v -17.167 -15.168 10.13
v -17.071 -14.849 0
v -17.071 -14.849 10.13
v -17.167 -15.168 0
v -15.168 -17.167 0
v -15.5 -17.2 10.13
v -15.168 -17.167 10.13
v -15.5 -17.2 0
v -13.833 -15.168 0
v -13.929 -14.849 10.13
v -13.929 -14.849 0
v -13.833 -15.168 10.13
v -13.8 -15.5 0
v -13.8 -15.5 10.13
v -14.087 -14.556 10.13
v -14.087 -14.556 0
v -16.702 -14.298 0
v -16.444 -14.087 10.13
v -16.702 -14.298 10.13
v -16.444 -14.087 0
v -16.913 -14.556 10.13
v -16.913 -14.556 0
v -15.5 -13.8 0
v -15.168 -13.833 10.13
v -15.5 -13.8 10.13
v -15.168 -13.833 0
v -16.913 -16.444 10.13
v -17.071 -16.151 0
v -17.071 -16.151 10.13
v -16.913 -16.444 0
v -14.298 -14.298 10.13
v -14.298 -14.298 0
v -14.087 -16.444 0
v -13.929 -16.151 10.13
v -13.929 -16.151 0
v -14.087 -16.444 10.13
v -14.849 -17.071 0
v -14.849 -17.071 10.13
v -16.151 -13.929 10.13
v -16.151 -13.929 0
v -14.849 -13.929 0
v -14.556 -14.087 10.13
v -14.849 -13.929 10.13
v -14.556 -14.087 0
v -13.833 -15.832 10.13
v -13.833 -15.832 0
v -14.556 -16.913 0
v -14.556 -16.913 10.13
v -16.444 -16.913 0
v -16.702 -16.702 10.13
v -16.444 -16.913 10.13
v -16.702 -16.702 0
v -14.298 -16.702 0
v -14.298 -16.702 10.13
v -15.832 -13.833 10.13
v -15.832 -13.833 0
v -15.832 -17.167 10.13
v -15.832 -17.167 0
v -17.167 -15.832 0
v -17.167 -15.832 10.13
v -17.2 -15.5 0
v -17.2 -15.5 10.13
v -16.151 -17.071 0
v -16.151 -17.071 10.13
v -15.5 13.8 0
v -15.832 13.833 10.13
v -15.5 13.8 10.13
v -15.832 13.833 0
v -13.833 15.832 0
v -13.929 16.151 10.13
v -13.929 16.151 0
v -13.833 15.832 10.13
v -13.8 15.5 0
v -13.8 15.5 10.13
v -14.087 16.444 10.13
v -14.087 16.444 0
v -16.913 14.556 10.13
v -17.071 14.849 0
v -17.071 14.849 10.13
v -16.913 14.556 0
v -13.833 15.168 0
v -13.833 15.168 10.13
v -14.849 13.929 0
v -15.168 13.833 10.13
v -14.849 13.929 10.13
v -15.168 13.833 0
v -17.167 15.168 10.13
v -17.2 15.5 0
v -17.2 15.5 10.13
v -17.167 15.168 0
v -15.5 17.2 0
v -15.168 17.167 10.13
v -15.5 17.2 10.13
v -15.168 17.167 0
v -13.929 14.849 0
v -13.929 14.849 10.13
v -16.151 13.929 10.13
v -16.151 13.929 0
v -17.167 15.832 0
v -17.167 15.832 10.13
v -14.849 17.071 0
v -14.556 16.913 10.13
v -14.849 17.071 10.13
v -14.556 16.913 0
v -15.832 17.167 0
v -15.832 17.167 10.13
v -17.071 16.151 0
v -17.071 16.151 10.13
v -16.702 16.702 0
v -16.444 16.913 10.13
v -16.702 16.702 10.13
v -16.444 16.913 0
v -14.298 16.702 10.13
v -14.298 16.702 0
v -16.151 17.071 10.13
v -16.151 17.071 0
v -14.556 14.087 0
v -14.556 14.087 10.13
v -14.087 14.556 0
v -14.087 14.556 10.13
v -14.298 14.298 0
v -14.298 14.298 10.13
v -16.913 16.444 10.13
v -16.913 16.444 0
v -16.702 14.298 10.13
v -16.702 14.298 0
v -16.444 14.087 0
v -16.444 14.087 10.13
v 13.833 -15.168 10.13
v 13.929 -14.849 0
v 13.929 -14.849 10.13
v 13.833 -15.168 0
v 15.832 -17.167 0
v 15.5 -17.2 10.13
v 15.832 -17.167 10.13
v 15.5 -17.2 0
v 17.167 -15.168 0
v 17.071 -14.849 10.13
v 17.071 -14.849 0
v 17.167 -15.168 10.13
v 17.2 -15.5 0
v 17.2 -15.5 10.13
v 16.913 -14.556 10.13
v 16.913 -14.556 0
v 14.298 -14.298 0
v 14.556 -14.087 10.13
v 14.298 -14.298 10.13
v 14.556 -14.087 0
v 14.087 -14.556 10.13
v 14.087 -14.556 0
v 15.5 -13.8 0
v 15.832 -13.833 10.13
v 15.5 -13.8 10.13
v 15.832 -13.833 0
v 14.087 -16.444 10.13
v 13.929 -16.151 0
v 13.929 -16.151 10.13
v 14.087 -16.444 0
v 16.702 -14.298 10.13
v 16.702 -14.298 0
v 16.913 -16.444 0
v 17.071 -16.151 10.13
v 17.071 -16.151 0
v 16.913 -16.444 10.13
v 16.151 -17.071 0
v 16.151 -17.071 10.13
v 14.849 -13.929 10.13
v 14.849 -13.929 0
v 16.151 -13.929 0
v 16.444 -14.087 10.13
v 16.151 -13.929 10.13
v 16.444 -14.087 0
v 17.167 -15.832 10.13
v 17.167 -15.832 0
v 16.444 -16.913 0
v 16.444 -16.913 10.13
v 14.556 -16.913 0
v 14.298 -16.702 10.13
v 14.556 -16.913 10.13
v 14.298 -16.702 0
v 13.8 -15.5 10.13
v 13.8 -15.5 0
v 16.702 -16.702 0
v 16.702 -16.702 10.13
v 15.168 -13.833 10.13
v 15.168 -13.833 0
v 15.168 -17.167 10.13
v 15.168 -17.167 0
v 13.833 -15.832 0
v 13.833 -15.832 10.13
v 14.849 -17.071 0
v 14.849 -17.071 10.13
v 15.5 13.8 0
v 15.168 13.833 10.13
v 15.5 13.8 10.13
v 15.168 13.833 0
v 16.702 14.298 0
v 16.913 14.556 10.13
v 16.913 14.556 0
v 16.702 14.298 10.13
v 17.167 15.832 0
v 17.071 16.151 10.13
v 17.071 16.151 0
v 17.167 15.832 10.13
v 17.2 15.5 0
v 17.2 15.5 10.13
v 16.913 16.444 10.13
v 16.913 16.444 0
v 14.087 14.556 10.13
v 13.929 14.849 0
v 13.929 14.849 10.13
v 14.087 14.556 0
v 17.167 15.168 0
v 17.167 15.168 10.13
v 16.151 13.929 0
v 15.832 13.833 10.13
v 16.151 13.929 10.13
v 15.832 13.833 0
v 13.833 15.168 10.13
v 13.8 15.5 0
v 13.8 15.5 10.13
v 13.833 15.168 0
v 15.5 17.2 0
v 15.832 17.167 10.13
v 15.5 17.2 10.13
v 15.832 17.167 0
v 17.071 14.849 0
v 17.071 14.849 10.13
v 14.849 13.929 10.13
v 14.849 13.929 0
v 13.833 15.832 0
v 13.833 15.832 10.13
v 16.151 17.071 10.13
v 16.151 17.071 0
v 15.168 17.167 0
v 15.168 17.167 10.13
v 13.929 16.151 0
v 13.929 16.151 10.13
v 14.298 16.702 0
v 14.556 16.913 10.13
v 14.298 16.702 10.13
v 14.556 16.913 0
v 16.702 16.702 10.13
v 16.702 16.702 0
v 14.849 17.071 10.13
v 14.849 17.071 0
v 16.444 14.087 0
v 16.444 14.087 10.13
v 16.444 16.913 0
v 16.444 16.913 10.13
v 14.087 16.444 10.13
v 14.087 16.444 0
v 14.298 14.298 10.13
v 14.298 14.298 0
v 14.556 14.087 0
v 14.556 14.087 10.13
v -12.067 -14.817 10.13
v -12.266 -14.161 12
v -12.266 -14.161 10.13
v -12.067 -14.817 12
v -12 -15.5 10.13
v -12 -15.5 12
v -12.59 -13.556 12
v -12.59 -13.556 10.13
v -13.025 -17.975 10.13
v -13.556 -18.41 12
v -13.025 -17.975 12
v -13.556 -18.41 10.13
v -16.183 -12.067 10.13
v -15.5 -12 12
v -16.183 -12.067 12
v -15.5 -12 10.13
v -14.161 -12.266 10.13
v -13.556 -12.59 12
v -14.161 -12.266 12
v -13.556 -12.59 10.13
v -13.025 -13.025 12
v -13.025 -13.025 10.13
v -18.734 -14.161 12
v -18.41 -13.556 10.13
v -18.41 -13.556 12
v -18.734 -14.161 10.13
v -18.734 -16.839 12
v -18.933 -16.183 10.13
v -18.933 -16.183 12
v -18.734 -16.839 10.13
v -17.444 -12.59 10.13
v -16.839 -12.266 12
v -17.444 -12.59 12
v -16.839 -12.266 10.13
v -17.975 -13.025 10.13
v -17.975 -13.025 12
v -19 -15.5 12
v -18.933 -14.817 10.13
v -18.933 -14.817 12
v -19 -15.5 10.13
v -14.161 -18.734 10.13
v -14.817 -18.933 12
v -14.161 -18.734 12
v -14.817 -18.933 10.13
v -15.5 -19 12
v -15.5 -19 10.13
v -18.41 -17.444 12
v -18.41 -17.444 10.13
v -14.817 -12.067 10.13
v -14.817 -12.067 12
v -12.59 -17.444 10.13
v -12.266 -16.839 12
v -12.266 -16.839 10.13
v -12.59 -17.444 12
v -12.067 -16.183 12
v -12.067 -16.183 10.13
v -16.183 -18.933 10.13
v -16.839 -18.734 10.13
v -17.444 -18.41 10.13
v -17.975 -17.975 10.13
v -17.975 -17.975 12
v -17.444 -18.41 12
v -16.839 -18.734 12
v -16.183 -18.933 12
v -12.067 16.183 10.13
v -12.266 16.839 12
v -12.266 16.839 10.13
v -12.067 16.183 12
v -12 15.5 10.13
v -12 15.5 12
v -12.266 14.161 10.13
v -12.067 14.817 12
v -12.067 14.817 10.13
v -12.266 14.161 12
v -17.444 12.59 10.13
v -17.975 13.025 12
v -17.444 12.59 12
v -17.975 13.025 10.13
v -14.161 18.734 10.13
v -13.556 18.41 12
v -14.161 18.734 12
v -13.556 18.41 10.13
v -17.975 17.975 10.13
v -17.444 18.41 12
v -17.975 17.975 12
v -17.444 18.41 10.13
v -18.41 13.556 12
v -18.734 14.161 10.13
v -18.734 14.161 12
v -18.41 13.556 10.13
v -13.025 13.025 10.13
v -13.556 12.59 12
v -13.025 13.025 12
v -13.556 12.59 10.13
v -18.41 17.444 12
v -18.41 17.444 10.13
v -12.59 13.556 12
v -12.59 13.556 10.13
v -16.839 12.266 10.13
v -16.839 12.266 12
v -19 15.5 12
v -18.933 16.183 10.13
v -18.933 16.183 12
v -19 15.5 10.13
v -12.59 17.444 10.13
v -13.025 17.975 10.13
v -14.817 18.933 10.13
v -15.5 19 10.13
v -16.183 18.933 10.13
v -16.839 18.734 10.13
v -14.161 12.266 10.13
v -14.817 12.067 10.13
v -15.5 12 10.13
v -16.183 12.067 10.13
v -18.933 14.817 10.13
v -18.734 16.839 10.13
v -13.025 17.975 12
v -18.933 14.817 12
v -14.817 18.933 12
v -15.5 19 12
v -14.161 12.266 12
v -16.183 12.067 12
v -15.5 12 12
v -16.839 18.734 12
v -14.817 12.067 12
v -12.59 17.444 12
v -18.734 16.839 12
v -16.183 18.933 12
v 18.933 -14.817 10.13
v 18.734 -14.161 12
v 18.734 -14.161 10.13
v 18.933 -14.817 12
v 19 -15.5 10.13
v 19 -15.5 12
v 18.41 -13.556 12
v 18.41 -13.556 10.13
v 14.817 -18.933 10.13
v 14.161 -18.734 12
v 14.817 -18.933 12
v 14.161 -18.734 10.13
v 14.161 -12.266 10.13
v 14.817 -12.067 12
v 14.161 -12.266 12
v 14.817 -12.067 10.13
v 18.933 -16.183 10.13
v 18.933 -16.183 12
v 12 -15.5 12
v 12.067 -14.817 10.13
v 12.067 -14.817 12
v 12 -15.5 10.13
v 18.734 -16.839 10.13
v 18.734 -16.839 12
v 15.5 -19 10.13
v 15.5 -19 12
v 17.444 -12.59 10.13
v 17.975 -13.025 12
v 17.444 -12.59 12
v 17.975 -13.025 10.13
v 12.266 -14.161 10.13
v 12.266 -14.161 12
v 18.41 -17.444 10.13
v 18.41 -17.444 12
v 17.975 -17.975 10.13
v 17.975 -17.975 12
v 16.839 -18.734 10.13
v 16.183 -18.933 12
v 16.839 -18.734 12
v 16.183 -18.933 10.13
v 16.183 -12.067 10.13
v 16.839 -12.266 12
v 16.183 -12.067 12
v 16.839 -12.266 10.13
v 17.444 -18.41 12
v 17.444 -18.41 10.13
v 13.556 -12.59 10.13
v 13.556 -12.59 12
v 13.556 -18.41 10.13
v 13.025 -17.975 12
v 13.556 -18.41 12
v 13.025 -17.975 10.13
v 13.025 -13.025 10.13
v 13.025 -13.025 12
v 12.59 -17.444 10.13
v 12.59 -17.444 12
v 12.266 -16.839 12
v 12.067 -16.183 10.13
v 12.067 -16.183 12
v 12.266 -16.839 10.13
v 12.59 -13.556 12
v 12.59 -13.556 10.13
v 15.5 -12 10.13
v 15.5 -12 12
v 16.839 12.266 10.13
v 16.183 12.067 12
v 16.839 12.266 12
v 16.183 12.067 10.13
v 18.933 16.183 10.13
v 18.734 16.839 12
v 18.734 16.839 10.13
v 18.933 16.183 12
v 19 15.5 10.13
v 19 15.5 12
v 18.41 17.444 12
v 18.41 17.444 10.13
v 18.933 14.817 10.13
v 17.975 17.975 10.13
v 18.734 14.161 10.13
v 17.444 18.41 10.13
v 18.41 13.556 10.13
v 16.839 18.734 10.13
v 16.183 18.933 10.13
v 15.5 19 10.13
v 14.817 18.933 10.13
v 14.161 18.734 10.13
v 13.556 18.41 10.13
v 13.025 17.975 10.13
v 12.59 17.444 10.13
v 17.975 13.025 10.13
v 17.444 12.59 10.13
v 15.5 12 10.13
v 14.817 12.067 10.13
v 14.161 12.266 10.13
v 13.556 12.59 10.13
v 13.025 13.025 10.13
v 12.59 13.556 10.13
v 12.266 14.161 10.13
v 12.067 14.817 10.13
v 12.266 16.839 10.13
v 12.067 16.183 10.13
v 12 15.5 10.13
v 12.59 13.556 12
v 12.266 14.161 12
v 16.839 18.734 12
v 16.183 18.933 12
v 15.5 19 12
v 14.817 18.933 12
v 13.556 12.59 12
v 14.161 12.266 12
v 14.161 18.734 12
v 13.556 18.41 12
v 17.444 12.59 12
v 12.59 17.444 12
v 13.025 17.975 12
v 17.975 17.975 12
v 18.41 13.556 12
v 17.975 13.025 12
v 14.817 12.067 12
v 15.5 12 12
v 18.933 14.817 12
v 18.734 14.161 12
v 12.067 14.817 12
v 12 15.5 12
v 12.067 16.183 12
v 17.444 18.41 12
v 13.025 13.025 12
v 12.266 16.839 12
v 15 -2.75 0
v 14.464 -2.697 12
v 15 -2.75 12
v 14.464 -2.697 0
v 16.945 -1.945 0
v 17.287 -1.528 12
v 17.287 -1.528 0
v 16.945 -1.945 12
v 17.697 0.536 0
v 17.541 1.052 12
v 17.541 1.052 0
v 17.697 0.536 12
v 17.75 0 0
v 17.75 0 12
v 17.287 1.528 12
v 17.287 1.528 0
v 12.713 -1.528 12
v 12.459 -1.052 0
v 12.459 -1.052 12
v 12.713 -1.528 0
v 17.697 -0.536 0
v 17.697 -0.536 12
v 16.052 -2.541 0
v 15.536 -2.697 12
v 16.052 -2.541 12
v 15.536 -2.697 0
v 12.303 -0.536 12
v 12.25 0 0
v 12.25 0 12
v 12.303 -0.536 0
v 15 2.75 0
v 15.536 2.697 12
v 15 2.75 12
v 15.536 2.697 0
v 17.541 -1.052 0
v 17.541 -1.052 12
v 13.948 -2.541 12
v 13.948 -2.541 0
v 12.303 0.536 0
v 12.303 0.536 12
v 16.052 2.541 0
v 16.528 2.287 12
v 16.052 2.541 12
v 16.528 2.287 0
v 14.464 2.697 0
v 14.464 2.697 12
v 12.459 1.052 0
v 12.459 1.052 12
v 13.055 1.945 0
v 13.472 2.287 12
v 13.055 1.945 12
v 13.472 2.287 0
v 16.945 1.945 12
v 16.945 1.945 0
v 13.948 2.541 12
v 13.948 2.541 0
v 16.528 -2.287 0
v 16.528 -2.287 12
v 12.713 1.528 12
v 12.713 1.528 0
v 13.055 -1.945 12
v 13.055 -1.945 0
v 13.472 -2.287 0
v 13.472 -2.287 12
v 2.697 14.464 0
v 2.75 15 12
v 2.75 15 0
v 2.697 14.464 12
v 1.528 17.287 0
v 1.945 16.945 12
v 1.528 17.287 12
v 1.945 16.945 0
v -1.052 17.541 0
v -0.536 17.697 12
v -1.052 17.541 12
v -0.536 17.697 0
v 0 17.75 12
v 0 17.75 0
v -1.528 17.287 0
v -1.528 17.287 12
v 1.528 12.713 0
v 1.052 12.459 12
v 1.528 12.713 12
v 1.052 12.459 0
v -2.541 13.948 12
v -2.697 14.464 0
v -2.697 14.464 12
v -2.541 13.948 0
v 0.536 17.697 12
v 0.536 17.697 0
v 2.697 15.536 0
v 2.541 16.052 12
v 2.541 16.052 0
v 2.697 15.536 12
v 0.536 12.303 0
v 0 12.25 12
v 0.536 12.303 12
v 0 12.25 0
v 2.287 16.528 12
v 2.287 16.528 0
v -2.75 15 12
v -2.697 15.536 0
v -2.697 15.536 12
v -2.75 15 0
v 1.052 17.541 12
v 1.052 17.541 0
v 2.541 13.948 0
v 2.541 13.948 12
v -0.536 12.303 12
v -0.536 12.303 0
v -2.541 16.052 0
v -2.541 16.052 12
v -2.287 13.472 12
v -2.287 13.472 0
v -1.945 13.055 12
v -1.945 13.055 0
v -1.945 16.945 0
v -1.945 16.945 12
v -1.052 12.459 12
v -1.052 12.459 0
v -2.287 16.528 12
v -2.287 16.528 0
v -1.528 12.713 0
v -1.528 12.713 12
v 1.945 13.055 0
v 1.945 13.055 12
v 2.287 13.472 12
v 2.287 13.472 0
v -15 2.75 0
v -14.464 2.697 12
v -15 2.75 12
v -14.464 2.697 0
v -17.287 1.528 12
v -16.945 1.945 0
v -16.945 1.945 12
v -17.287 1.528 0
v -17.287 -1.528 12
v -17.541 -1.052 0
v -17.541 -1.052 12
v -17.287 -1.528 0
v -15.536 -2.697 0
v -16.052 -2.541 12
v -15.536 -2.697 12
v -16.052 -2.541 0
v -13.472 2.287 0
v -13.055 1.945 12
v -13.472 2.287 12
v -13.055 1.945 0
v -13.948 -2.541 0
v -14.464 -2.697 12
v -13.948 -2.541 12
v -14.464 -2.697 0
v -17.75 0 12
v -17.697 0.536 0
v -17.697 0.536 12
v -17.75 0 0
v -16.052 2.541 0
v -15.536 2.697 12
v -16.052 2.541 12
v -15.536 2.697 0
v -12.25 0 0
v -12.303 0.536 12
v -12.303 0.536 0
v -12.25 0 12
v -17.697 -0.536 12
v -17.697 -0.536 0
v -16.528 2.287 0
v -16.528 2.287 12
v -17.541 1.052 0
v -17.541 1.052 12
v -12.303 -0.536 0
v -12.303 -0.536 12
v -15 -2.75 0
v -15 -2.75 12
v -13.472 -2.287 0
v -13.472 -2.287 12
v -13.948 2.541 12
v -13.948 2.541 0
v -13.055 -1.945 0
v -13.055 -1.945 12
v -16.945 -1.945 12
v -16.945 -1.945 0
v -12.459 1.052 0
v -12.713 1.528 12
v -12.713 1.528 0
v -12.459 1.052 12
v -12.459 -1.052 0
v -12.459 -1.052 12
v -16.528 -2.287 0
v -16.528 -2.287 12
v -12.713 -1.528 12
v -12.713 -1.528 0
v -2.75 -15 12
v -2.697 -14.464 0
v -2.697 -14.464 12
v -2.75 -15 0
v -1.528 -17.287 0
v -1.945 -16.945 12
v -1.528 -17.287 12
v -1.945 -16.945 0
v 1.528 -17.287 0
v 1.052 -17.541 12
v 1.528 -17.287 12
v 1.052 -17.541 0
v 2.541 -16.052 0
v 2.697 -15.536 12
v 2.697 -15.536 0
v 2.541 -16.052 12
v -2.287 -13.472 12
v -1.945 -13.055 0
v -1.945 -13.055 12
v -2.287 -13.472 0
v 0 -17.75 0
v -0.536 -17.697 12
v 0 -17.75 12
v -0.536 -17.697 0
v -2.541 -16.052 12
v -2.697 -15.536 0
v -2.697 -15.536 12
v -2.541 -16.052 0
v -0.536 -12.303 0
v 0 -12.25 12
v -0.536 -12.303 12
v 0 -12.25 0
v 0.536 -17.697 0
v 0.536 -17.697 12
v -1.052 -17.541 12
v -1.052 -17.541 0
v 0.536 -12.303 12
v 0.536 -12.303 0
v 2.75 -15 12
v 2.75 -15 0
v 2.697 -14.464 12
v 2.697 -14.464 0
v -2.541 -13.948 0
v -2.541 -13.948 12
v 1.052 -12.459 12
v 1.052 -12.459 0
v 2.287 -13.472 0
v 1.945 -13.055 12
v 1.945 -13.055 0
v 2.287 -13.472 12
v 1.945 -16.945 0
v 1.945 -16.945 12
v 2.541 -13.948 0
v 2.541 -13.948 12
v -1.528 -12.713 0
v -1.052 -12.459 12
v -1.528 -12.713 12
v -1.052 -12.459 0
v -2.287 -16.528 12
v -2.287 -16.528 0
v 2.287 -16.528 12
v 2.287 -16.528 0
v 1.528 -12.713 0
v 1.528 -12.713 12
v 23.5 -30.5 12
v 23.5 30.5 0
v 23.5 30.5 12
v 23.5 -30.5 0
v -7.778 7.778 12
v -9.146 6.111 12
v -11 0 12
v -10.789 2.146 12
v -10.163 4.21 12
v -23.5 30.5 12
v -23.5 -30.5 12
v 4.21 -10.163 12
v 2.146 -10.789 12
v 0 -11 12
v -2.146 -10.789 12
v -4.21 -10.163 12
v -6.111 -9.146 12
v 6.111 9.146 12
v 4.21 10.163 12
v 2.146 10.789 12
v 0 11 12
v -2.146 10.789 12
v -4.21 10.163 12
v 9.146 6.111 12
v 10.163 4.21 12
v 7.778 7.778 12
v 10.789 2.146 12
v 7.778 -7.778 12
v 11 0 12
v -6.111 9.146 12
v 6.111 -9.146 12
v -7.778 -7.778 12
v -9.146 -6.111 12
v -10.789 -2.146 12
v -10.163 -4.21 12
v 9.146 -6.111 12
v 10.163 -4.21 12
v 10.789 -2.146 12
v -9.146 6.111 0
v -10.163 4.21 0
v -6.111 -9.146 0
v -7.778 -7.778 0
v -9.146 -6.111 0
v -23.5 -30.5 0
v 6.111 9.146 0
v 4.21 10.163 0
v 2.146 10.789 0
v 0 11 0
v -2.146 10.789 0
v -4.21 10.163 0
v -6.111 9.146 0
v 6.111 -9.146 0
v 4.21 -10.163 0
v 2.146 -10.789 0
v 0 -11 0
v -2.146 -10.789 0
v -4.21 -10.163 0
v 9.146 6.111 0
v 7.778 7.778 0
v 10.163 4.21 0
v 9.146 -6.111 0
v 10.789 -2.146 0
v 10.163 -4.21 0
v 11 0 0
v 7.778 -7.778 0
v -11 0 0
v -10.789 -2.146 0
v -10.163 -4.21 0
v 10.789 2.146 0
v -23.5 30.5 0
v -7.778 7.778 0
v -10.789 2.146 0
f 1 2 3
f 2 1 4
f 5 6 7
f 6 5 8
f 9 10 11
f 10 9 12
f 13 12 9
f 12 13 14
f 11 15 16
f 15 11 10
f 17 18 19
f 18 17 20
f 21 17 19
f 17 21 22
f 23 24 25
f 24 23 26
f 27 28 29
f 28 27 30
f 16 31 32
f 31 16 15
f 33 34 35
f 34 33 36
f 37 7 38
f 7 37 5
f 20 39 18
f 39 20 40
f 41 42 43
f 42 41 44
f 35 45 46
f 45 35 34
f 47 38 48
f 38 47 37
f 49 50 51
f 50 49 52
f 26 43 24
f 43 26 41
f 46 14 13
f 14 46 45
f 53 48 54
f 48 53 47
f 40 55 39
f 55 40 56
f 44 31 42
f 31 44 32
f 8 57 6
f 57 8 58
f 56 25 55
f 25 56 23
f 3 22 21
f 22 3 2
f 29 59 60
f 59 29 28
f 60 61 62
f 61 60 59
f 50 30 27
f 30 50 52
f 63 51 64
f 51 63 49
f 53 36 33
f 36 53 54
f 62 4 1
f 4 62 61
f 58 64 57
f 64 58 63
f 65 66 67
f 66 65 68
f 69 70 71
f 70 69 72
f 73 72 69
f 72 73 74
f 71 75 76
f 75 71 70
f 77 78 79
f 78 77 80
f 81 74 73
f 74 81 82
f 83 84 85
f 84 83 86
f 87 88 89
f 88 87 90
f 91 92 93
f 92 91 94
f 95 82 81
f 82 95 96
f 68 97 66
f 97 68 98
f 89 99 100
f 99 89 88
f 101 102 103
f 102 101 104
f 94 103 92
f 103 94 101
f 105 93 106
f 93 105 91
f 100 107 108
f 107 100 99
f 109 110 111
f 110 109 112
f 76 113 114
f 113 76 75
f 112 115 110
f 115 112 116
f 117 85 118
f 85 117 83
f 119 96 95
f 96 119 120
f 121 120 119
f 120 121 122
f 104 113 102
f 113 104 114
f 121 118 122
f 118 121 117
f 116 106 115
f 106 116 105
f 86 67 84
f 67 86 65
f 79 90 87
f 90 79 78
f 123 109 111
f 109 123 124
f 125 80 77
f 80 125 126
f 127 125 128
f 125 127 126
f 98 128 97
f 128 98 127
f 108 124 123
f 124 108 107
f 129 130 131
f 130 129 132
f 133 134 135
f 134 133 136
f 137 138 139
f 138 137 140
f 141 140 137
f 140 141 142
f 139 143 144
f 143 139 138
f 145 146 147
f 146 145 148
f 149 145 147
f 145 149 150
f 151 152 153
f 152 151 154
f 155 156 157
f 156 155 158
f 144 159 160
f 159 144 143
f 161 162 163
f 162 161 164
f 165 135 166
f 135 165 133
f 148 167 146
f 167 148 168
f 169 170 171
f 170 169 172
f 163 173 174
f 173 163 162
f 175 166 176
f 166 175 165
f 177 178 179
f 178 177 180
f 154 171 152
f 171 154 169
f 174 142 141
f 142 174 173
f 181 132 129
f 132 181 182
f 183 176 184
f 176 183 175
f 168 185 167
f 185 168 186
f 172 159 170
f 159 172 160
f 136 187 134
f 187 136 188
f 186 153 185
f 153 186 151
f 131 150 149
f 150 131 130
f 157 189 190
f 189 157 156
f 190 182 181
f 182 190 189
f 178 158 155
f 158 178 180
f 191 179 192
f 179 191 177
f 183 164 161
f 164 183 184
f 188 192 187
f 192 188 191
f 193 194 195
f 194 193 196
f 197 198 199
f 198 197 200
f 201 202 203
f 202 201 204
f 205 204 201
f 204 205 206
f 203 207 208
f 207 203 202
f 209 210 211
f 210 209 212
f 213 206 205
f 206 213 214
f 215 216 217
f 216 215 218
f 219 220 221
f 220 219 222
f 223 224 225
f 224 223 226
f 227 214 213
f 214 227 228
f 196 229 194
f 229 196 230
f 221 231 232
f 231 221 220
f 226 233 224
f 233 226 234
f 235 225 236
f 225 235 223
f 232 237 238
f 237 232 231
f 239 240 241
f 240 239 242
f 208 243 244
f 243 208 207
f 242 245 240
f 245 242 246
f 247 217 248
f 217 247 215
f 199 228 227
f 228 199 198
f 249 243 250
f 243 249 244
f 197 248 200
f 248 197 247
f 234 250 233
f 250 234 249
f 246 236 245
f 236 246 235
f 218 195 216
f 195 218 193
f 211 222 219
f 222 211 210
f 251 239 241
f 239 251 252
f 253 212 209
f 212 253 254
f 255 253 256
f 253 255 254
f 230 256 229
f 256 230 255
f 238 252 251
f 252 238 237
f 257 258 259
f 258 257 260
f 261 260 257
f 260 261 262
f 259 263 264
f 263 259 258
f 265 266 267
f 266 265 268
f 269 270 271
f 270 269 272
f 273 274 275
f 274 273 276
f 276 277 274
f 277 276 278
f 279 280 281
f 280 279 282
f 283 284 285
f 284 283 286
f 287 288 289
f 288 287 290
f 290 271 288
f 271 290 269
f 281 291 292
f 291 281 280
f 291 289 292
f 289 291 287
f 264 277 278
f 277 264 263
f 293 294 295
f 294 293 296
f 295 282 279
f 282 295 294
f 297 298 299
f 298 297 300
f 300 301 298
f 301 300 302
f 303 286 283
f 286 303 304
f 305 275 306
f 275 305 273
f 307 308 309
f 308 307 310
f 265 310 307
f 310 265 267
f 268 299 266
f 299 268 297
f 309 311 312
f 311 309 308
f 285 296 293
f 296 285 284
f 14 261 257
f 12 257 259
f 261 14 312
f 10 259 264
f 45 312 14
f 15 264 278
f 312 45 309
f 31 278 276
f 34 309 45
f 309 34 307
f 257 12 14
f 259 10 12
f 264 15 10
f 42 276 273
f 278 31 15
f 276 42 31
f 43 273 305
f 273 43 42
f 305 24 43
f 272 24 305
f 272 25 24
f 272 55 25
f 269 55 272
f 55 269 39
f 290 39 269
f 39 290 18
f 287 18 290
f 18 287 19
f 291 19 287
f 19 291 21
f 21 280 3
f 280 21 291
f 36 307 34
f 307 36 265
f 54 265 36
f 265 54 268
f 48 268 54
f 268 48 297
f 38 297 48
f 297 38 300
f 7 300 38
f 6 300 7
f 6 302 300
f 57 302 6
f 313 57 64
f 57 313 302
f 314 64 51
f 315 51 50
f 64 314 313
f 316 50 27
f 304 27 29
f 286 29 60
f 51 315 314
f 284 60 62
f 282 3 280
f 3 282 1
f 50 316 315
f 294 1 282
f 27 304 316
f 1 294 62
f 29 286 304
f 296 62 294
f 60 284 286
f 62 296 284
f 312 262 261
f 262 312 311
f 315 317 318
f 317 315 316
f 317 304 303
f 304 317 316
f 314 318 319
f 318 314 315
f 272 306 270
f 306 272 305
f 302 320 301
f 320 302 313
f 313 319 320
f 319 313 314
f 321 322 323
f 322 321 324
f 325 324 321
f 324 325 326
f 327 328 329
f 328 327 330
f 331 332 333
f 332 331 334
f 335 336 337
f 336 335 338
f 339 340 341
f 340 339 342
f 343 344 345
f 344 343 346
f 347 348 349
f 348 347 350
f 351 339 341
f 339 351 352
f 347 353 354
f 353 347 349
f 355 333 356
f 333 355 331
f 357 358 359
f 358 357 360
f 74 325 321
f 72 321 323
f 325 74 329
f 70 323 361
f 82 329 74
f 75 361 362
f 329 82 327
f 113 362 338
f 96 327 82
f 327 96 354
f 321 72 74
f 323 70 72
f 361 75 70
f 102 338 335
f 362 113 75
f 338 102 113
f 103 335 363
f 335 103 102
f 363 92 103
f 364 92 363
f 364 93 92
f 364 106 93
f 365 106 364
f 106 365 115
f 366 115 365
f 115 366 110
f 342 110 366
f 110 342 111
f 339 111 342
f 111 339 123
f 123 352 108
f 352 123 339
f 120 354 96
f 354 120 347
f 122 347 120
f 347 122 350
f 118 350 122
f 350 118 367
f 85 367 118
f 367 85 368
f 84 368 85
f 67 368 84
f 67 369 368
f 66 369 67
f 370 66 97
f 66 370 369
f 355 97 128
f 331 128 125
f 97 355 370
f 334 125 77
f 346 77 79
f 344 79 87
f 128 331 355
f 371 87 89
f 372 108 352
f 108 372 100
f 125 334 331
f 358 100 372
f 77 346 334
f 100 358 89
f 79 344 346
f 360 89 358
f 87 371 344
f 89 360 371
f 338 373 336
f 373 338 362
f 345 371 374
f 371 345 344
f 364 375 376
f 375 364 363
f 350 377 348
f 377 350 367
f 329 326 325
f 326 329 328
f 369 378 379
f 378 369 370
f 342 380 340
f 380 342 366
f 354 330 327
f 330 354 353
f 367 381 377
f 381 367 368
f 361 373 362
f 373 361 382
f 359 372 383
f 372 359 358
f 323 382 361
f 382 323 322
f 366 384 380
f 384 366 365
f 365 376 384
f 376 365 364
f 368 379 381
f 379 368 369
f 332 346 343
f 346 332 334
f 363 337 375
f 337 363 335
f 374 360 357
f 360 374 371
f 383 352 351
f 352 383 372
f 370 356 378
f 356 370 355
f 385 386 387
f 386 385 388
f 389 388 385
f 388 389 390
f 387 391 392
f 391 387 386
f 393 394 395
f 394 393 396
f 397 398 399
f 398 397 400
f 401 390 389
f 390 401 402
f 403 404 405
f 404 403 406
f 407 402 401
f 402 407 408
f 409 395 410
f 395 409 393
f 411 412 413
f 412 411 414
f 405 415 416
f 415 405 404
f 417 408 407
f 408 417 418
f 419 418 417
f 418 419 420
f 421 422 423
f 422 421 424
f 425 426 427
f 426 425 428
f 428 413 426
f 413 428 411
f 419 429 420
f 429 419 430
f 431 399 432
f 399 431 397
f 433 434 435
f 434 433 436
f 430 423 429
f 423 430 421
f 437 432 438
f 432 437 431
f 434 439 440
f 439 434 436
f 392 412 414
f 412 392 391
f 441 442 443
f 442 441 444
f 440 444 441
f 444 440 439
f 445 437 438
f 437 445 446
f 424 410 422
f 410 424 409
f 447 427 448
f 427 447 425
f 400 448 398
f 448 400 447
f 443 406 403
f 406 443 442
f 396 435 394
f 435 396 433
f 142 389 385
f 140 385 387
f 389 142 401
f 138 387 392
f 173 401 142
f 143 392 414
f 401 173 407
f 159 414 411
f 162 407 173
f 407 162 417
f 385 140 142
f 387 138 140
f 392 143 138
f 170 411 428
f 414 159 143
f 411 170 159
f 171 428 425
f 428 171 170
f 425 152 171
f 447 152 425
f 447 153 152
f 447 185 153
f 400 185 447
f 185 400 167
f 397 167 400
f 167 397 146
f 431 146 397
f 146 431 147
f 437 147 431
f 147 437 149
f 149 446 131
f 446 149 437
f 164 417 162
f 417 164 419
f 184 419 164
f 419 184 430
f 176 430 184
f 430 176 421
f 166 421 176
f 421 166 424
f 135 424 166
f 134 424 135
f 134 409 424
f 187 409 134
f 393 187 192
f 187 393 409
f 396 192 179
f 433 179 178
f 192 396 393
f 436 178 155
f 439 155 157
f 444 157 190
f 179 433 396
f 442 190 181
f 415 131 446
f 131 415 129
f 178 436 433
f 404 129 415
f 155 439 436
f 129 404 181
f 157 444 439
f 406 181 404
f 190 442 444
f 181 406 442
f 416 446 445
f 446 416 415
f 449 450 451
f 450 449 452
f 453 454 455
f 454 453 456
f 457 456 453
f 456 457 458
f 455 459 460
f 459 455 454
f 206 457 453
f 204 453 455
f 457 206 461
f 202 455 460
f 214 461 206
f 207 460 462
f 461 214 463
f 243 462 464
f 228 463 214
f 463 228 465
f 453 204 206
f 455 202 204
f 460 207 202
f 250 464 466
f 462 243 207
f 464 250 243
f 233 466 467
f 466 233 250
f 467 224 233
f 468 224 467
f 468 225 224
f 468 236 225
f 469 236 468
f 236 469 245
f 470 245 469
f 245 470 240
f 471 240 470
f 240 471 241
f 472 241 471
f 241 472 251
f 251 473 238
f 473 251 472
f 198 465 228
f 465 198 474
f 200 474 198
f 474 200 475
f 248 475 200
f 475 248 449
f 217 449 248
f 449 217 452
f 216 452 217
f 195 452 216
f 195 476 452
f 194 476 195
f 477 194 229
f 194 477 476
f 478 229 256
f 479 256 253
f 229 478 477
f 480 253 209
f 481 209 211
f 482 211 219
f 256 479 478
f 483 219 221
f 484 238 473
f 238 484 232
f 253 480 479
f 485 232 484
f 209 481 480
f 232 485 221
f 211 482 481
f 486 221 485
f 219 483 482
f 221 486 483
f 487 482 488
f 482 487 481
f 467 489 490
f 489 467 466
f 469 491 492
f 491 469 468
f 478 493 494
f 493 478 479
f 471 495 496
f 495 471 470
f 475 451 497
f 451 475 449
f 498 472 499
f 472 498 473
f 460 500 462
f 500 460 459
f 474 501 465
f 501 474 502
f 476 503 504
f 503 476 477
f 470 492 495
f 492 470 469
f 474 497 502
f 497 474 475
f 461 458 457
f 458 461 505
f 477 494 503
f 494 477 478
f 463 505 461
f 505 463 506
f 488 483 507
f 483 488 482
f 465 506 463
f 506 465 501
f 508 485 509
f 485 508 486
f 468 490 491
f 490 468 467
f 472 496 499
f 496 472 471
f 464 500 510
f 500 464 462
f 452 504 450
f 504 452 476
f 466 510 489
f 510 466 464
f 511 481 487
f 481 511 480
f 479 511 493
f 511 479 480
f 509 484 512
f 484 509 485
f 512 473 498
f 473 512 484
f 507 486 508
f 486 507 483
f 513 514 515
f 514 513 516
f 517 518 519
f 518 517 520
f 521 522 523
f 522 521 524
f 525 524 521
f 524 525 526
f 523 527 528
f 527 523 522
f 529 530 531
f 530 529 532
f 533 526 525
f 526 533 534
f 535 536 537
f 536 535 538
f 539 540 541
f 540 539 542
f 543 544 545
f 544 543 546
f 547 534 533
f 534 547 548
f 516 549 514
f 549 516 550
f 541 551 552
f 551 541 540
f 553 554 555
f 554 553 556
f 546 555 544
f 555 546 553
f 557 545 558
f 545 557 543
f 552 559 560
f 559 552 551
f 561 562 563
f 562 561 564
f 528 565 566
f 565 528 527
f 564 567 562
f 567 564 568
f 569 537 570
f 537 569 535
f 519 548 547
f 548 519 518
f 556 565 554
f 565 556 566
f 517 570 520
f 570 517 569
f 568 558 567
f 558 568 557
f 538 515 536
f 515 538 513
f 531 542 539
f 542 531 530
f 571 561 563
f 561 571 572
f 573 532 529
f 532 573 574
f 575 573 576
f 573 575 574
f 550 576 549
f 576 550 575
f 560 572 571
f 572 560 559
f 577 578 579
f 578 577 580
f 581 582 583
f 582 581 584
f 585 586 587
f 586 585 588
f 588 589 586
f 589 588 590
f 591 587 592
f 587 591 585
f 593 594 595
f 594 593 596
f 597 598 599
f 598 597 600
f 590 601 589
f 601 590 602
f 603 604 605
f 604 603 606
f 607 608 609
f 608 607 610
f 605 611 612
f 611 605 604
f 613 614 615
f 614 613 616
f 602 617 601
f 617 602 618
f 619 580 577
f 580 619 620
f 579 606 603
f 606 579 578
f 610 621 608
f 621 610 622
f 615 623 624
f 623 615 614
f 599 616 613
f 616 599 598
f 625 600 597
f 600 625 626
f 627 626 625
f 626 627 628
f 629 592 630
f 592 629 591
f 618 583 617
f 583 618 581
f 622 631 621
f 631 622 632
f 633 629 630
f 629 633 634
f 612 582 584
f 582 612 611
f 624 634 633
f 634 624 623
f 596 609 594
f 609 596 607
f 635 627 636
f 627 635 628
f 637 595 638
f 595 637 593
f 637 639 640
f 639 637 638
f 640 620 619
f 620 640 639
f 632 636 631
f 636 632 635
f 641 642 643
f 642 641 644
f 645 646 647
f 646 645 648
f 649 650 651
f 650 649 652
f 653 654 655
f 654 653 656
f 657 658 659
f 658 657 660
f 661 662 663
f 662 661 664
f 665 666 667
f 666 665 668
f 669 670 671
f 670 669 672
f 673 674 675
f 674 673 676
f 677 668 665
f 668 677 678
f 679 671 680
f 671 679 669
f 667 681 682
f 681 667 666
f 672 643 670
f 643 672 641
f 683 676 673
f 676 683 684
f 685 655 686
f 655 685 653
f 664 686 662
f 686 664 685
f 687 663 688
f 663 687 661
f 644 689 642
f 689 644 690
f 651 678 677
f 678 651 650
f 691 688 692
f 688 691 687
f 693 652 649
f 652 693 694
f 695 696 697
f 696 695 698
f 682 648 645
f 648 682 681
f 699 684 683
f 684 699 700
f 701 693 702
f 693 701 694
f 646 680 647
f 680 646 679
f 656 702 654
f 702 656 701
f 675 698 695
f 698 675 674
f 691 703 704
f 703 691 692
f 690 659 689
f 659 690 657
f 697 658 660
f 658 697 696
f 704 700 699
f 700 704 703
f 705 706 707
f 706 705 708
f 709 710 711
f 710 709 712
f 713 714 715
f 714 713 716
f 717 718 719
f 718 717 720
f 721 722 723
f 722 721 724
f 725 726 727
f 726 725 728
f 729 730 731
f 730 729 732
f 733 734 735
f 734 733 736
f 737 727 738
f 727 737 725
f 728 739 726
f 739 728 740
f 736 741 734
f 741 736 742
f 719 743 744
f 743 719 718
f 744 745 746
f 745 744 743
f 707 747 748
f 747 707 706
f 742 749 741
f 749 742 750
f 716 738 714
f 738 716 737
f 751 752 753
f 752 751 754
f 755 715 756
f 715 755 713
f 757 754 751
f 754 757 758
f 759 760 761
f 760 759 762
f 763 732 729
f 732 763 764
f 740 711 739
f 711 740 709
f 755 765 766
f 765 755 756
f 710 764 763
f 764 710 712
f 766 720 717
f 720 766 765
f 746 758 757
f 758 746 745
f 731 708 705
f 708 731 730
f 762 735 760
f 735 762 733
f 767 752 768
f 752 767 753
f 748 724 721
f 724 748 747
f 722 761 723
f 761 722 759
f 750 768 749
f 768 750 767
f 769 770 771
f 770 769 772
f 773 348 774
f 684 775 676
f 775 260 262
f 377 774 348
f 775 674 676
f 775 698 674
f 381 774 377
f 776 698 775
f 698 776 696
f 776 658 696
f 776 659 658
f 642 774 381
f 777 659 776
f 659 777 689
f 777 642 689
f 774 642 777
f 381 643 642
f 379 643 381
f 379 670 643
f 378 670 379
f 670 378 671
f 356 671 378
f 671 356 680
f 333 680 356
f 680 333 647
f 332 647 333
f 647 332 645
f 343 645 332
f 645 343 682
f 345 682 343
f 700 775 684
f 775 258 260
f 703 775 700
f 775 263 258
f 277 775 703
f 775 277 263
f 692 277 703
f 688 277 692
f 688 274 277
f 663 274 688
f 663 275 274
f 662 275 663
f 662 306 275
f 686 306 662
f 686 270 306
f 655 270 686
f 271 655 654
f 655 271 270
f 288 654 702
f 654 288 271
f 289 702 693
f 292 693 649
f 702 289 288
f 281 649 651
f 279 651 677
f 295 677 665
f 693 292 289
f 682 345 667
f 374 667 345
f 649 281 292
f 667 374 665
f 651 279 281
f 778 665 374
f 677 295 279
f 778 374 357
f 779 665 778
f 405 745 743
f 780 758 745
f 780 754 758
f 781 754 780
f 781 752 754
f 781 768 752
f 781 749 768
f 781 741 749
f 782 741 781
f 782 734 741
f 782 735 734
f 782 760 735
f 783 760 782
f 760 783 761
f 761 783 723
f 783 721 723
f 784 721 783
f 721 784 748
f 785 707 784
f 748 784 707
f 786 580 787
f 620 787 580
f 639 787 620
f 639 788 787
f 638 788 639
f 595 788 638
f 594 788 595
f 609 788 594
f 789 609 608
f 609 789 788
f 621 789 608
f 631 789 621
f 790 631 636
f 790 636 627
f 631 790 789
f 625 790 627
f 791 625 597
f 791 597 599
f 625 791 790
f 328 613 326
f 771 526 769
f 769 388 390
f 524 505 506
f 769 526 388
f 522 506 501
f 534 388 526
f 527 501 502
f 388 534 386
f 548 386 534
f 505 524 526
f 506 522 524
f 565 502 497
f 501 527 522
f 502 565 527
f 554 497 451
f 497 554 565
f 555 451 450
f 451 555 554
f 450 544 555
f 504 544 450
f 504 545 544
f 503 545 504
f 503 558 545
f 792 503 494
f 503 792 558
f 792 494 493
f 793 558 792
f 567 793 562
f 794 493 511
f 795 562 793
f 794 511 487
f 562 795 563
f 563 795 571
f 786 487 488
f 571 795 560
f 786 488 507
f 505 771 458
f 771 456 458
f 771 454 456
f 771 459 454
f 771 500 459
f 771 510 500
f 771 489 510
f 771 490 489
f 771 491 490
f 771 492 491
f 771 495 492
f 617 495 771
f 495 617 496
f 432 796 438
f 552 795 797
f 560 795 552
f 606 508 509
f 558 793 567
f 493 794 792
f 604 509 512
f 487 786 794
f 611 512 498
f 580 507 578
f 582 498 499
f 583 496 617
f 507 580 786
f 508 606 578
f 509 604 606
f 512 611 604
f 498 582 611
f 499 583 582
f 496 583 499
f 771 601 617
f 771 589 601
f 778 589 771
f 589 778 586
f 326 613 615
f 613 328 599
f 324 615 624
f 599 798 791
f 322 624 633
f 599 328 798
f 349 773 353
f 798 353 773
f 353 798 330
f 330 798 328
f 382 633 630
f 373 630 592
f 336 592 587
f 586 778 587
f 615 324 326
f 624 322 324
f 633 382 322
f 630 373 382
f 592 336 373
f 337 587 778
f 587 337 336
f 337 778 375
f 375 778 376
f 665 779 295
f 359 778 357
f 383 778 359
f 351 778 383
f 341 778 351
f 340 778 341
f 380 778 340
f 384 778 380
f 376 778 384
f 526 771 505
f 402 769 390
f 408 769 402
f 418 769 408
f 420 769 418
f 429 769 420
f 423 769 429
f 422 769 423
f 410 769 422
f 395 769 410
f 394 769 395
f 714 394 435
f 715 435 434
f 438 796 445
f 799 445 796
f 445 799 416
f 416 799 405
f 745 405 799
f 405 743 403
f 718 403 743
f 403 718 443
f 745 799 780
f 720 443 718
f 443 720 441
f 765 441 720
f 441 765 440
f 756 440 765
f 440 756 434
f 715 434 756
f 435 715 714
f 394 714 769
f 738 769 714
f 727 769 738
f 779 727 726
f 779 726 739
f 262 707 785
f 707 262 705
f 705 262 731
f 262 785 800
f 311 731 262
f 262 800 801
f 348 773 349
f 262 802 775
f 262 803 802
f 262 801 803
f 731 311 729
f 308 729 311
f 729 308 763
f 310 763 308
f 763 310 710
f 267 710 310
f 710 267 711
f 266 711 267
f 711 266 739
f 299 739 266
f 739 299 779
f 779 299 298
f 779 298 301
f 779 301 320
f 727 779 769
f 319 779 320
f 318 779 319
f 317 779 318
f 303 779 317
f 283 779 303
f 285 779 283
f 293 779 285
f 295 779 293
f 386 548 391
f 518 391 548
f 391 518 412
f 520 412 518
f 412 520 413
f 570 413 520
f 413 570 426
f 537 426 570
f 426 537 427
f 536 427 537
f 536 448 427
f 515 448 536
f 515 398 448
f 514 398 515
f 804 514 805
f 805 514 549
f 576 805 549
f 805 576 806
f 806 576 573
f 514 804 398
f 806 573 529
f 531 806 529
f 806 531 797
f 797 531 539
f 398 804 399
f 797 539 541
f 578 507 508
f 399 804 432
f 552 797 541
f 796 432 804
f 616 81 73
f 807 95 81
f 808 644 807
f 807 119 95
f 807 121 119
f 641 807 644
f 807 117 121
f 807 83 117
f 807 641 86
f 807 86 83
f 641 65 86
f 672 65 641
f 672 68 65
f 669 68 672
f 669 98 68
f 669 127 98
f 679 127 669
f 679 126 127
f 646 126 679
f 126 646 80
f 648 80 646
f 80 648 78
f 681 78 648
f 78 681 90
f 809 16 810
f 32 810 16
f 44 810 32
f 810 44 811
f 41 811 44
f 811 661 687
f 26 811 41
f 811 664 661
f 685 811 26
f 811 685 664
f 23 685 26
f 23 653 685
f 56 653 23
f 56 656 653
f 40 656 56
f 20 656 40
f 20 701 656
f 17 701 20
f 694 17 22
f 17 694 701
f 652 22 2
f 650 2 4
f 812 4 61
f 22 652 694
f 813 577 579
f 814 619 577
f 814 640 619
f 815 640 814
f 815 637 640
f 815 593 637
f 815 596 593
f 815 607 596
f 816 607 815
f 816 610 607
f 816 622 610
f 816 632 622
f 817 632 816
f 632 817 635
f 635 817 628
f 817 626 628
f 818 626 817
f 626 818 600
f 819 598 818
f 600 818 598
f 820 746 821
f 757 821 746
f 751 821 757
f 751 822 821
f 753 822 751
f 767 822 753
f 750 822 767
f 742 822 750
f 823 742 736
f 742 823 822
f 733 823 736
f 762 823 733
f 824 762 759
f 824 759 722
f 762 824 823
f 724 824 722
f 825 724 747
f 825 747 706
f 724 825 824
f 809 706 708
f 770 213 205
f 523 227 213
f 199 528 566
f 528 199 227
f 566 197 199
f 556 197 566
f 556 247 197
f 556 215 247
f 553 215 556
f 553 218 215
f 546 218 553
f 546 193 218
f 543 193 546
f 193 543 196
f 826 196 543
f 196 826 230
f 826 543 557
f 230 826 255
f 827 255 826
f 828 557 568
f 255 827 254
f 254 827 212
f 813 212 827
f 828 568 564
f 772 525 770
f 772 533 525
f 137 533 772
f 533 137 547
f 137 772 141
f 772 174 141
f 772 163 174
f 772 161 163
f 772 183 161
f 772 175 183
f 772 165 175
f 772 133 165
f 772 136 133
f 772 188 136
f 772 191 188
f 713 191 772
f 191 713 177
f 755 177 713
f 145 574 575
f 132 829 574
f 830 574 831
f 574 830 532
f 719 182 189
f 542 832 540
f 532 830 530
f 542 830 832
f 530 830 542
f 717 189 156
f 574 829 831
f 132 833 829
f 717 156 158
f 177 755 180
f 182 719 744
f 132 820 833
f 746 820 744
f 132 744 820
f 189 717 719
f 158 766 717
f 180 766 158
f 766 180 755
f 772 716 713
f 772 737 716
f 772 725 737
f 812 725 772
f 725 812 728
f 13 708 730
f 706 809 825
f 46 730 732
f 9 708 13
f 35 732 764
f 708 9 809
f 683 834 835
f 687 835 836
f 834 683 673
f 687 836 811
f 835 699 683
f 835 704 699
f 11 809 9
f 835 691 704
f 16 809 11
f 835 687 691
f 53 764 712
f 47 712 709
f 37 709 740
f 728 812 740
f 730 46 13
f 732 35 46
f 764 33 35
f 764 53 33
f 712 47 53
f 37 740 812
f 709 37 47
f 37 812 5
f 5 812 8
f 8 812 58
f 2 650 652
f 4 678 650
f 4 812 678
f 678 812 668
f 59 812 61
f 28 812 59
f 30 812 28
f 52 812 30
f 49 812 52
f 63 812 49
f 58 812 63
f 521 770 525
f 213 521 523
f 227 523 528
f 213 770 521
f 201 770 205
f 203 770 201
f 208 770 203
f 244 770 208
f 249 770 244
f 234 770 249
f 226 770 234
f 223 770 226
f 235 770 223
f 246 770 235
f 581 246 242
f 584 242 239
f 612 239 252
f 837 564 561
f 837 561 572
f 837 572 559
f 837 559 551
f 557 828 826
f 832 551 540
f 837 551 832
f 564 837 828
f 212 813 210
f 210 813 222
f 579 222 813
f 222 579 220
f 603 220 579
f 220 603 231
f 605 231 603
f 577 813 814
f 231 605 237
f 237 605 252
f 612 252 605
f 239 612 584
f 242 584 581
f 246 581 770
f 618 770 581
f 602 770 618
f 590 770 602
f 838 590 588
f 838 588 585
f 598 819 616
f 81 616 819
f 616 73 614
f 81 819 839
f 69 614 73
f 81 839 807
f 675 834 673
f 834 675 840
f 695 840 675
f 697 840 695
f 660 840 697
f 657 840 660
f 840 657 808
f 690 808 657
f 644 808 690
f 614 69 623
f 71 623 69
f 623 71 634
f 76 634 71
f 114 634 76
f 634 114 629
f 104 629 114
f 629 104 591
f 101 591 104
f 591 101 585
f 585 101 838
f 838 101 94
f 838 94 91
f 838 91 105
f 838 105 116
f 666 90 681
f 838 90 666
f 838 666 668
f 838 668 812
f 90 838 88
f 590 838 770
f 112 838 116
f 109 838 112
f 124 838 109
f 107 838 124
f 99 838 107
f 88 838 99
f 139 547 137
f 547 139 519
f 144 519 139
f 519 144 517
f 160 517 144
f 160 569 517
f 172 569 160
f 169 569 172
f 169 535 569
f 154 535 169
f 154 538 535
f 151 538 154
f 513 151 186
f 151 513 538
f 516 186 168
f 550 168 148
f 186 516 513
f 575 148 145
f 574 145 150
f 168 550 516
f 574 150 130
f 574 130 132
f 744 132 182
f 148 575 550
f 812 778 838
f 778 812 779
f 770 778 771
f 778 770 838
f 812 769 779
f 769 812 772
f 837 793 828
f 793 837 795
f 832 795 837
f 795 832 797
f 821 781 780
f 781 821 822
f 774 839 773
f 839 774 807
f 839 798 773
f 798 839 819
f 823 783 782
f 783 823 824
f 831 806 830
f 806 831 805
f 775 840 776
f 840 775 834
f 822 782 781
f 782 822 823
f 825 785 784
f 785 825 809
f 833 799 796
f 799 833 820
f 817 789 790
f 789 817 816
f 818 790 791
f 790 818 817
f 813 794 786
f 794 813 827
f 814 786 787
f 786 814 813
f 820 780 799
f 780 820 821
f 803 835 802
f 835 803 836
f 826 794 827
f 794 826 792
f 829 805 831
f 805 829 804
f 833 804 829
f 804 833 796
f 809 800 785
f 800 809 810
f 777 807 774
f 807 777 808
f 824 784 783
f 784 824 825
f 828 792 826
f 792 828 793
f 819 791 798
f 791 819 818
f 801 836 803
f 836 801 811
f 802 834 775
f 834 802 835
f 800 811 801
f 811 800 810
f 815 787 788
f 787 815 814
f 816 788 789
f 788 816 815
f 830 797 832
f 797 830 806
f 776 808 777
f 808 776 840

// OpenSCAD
$fn = 32;

// ----------------------------------------------------------------------
// Motor mount plate: NEMA17, 47 x 61 x 12 mm
// ----------------------------------------------------------------------

// --- parameters (mm) ---
plate_w = 47;             // plate length, X
plate_d = 61;             // plate width, Y
plate_t = 12;             // plate thickness
pattern = 31;             // NEMA17 bolt spacing
motor_d = 3.4;            // NEMA17 screw clearance
pilot_d = 22;             // pilot boss bore
cb_d = 7;                 // counterbore seat
cb_h = 1.87;              // counterbore depth
second_d = 5.5;           // second fastener hole
bc_r = 15;                // second bolt circle radius
bc_n = 4;                 // second bolt circle count

module plate() {
  translate([-plate_w / 2, -plate_d / 2, 0]) cube([plate_w, plate_d, plate_t]);
}

module motor_holes() {
  for (sx = [-1, 1]) for (sy = [-1, 1])
    translate([sx * pattern / 2, sy * pattern / 2, -1])
      cylinder(h = plate_t + 2, d = motor_d);
}
module motor_counterbores() {
  for (sx = [-1, 1]) for (sy = [-1, 1])
    translate([sx * pattern / 2, sy * pattern / 2, plate_t - cb_h])
      cylinder(h = cb_h + 0.6, d = cb_d);
}

difference() {
  union() {
    plate();
  }
  motor_holes();
  translate([0, 0, -1]) cylinder(h = plate_t + 2, d = pilot_d);
  motor_counterbores();
  for (i = [0 : bc_n - 1]) rotate([0, 0, i * 360 / bc_n]) translate([bc_r, 0, -1])    cylinder(h = plate_t + 2, d = second_d);
}
